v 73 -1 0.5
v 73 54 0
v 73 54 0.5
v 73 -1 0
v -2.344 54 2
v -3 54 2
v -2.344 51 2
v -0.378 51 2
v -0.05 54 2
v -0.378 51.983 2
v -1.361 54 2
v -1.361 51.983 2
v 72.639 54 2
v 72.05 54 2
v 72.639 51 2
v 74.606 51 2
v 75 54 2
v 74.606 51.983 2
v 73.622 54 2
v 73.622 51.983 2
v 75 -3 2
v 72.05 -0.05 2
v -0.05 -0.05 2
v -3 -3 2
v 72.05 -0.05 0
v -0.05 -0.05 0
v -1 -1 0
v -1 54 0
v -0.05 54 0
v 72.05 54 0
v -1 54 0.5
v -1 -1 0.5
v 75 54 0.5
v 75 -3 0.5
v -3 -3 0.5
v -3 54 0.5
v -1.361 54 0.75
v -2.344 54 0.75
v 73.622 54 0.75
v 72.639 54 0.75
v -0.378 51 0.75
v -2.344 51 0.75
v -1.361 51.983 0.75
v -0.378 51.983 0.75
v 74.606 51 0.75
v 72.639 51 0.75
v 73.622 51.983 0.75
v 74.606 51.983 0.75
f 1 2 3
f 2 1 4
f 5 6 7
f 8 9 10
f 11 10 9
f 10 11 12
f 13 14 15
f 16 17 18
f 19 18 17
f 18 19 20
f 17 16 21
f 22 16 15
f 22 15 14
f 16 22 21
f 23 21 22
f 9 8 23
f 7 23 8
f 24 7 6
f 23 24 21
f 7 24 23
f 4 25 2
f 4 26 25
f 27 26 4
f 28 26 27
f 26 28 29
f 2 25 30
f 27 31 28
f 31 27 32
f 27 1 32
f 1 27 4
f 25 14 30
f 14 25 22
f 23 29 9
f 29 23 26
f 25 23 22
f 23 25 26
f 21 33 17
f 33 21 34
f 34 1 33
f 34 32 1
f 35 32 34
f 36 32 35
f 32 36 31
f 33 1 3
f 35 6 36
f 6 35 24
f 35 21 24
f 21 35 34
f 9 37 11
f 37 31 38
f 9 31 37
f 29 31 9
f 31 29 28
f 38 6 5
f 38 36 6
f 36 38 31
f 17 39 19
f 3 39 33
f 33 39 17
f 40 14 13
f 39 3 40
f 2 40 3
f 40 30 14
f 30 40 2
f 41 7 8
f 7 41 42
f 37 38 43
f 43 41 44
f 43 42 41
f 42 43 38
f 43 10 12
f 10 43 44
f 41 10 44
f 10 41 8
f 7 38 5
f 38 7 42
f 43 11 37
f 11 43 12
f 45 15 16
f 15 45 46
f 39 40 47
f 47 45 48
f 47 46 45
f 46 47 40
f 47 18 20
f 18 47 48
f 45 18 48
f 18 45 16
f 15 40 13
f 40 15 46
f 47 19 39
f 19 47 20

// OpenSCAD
// Generated by SolidPython 0.4.8 on 2020-11-30 10:40:59


difference() {
	difference() {
		difference() {
			union() {
				difference() {
					translate(v = [-1.0000000000, -1.0000000000, 0]) {
						cube(size = [74.0000000000, 110.0000000000, 2]);
					}
					translate(v = [-0.0500000000, -0.0500000000, 0]) {
						cube(size = [72.1000000000, 108.1000000000, 2]);
					}
				}
				translate(v = [0, 0, 0.5000000000]) {
					difference() {
						translate(v = [-3.0000000000, -3.0000000000, 0]) {
							cube(size = [78.0000000000, 114.0000000000, 1.5000000000]);
						}
						translate(v = [-1.0000000000, -1.0000000000, 0]) {
							cube(size = [74.0000000000, 110.0000000000, 1.5000000000]);
						}
					}
				}
			}
			translate(v = [-3.0000000000, 54.0000000000, 0]) {
				cube(size = [78.0000000000, 57.0000000000, 2]);
			}
		}
		translate(v = [-2.3444444444, 51.0000000000, 0]) {
			translate(v = [0, 0, 0.7500000000]) {
				translate(v = [0, 3, 0]) {
					rotate(a = -90) {
						union() {
							translate(v = [2.0166666667, 0, 0]) {
								cube(size = [0.9833333333, 1.9666666667, 1.2500000000]);
							}
							cube(size = [3, 0.9833333333, 1.2500000000]);
						}
					}
				}
			}
		}
	}
	translate(v = [72.6388888889, 51.0000000000, 0]) {
		translate(v = [0, 0, 0.7500000000]) {
			translate(v = [0, 3, 0]) {
				rotate(a = -90) {
					union() {
						translate(v = [2.0166666667, 0, 0]) {
							cube(size = [0.9833333333, 1.9666666667, 1.2500000000]);
						}
						cube(size = [3, 0.9833333333, 1.2500000000]);
					}
				}
			}
		}
	}
}
